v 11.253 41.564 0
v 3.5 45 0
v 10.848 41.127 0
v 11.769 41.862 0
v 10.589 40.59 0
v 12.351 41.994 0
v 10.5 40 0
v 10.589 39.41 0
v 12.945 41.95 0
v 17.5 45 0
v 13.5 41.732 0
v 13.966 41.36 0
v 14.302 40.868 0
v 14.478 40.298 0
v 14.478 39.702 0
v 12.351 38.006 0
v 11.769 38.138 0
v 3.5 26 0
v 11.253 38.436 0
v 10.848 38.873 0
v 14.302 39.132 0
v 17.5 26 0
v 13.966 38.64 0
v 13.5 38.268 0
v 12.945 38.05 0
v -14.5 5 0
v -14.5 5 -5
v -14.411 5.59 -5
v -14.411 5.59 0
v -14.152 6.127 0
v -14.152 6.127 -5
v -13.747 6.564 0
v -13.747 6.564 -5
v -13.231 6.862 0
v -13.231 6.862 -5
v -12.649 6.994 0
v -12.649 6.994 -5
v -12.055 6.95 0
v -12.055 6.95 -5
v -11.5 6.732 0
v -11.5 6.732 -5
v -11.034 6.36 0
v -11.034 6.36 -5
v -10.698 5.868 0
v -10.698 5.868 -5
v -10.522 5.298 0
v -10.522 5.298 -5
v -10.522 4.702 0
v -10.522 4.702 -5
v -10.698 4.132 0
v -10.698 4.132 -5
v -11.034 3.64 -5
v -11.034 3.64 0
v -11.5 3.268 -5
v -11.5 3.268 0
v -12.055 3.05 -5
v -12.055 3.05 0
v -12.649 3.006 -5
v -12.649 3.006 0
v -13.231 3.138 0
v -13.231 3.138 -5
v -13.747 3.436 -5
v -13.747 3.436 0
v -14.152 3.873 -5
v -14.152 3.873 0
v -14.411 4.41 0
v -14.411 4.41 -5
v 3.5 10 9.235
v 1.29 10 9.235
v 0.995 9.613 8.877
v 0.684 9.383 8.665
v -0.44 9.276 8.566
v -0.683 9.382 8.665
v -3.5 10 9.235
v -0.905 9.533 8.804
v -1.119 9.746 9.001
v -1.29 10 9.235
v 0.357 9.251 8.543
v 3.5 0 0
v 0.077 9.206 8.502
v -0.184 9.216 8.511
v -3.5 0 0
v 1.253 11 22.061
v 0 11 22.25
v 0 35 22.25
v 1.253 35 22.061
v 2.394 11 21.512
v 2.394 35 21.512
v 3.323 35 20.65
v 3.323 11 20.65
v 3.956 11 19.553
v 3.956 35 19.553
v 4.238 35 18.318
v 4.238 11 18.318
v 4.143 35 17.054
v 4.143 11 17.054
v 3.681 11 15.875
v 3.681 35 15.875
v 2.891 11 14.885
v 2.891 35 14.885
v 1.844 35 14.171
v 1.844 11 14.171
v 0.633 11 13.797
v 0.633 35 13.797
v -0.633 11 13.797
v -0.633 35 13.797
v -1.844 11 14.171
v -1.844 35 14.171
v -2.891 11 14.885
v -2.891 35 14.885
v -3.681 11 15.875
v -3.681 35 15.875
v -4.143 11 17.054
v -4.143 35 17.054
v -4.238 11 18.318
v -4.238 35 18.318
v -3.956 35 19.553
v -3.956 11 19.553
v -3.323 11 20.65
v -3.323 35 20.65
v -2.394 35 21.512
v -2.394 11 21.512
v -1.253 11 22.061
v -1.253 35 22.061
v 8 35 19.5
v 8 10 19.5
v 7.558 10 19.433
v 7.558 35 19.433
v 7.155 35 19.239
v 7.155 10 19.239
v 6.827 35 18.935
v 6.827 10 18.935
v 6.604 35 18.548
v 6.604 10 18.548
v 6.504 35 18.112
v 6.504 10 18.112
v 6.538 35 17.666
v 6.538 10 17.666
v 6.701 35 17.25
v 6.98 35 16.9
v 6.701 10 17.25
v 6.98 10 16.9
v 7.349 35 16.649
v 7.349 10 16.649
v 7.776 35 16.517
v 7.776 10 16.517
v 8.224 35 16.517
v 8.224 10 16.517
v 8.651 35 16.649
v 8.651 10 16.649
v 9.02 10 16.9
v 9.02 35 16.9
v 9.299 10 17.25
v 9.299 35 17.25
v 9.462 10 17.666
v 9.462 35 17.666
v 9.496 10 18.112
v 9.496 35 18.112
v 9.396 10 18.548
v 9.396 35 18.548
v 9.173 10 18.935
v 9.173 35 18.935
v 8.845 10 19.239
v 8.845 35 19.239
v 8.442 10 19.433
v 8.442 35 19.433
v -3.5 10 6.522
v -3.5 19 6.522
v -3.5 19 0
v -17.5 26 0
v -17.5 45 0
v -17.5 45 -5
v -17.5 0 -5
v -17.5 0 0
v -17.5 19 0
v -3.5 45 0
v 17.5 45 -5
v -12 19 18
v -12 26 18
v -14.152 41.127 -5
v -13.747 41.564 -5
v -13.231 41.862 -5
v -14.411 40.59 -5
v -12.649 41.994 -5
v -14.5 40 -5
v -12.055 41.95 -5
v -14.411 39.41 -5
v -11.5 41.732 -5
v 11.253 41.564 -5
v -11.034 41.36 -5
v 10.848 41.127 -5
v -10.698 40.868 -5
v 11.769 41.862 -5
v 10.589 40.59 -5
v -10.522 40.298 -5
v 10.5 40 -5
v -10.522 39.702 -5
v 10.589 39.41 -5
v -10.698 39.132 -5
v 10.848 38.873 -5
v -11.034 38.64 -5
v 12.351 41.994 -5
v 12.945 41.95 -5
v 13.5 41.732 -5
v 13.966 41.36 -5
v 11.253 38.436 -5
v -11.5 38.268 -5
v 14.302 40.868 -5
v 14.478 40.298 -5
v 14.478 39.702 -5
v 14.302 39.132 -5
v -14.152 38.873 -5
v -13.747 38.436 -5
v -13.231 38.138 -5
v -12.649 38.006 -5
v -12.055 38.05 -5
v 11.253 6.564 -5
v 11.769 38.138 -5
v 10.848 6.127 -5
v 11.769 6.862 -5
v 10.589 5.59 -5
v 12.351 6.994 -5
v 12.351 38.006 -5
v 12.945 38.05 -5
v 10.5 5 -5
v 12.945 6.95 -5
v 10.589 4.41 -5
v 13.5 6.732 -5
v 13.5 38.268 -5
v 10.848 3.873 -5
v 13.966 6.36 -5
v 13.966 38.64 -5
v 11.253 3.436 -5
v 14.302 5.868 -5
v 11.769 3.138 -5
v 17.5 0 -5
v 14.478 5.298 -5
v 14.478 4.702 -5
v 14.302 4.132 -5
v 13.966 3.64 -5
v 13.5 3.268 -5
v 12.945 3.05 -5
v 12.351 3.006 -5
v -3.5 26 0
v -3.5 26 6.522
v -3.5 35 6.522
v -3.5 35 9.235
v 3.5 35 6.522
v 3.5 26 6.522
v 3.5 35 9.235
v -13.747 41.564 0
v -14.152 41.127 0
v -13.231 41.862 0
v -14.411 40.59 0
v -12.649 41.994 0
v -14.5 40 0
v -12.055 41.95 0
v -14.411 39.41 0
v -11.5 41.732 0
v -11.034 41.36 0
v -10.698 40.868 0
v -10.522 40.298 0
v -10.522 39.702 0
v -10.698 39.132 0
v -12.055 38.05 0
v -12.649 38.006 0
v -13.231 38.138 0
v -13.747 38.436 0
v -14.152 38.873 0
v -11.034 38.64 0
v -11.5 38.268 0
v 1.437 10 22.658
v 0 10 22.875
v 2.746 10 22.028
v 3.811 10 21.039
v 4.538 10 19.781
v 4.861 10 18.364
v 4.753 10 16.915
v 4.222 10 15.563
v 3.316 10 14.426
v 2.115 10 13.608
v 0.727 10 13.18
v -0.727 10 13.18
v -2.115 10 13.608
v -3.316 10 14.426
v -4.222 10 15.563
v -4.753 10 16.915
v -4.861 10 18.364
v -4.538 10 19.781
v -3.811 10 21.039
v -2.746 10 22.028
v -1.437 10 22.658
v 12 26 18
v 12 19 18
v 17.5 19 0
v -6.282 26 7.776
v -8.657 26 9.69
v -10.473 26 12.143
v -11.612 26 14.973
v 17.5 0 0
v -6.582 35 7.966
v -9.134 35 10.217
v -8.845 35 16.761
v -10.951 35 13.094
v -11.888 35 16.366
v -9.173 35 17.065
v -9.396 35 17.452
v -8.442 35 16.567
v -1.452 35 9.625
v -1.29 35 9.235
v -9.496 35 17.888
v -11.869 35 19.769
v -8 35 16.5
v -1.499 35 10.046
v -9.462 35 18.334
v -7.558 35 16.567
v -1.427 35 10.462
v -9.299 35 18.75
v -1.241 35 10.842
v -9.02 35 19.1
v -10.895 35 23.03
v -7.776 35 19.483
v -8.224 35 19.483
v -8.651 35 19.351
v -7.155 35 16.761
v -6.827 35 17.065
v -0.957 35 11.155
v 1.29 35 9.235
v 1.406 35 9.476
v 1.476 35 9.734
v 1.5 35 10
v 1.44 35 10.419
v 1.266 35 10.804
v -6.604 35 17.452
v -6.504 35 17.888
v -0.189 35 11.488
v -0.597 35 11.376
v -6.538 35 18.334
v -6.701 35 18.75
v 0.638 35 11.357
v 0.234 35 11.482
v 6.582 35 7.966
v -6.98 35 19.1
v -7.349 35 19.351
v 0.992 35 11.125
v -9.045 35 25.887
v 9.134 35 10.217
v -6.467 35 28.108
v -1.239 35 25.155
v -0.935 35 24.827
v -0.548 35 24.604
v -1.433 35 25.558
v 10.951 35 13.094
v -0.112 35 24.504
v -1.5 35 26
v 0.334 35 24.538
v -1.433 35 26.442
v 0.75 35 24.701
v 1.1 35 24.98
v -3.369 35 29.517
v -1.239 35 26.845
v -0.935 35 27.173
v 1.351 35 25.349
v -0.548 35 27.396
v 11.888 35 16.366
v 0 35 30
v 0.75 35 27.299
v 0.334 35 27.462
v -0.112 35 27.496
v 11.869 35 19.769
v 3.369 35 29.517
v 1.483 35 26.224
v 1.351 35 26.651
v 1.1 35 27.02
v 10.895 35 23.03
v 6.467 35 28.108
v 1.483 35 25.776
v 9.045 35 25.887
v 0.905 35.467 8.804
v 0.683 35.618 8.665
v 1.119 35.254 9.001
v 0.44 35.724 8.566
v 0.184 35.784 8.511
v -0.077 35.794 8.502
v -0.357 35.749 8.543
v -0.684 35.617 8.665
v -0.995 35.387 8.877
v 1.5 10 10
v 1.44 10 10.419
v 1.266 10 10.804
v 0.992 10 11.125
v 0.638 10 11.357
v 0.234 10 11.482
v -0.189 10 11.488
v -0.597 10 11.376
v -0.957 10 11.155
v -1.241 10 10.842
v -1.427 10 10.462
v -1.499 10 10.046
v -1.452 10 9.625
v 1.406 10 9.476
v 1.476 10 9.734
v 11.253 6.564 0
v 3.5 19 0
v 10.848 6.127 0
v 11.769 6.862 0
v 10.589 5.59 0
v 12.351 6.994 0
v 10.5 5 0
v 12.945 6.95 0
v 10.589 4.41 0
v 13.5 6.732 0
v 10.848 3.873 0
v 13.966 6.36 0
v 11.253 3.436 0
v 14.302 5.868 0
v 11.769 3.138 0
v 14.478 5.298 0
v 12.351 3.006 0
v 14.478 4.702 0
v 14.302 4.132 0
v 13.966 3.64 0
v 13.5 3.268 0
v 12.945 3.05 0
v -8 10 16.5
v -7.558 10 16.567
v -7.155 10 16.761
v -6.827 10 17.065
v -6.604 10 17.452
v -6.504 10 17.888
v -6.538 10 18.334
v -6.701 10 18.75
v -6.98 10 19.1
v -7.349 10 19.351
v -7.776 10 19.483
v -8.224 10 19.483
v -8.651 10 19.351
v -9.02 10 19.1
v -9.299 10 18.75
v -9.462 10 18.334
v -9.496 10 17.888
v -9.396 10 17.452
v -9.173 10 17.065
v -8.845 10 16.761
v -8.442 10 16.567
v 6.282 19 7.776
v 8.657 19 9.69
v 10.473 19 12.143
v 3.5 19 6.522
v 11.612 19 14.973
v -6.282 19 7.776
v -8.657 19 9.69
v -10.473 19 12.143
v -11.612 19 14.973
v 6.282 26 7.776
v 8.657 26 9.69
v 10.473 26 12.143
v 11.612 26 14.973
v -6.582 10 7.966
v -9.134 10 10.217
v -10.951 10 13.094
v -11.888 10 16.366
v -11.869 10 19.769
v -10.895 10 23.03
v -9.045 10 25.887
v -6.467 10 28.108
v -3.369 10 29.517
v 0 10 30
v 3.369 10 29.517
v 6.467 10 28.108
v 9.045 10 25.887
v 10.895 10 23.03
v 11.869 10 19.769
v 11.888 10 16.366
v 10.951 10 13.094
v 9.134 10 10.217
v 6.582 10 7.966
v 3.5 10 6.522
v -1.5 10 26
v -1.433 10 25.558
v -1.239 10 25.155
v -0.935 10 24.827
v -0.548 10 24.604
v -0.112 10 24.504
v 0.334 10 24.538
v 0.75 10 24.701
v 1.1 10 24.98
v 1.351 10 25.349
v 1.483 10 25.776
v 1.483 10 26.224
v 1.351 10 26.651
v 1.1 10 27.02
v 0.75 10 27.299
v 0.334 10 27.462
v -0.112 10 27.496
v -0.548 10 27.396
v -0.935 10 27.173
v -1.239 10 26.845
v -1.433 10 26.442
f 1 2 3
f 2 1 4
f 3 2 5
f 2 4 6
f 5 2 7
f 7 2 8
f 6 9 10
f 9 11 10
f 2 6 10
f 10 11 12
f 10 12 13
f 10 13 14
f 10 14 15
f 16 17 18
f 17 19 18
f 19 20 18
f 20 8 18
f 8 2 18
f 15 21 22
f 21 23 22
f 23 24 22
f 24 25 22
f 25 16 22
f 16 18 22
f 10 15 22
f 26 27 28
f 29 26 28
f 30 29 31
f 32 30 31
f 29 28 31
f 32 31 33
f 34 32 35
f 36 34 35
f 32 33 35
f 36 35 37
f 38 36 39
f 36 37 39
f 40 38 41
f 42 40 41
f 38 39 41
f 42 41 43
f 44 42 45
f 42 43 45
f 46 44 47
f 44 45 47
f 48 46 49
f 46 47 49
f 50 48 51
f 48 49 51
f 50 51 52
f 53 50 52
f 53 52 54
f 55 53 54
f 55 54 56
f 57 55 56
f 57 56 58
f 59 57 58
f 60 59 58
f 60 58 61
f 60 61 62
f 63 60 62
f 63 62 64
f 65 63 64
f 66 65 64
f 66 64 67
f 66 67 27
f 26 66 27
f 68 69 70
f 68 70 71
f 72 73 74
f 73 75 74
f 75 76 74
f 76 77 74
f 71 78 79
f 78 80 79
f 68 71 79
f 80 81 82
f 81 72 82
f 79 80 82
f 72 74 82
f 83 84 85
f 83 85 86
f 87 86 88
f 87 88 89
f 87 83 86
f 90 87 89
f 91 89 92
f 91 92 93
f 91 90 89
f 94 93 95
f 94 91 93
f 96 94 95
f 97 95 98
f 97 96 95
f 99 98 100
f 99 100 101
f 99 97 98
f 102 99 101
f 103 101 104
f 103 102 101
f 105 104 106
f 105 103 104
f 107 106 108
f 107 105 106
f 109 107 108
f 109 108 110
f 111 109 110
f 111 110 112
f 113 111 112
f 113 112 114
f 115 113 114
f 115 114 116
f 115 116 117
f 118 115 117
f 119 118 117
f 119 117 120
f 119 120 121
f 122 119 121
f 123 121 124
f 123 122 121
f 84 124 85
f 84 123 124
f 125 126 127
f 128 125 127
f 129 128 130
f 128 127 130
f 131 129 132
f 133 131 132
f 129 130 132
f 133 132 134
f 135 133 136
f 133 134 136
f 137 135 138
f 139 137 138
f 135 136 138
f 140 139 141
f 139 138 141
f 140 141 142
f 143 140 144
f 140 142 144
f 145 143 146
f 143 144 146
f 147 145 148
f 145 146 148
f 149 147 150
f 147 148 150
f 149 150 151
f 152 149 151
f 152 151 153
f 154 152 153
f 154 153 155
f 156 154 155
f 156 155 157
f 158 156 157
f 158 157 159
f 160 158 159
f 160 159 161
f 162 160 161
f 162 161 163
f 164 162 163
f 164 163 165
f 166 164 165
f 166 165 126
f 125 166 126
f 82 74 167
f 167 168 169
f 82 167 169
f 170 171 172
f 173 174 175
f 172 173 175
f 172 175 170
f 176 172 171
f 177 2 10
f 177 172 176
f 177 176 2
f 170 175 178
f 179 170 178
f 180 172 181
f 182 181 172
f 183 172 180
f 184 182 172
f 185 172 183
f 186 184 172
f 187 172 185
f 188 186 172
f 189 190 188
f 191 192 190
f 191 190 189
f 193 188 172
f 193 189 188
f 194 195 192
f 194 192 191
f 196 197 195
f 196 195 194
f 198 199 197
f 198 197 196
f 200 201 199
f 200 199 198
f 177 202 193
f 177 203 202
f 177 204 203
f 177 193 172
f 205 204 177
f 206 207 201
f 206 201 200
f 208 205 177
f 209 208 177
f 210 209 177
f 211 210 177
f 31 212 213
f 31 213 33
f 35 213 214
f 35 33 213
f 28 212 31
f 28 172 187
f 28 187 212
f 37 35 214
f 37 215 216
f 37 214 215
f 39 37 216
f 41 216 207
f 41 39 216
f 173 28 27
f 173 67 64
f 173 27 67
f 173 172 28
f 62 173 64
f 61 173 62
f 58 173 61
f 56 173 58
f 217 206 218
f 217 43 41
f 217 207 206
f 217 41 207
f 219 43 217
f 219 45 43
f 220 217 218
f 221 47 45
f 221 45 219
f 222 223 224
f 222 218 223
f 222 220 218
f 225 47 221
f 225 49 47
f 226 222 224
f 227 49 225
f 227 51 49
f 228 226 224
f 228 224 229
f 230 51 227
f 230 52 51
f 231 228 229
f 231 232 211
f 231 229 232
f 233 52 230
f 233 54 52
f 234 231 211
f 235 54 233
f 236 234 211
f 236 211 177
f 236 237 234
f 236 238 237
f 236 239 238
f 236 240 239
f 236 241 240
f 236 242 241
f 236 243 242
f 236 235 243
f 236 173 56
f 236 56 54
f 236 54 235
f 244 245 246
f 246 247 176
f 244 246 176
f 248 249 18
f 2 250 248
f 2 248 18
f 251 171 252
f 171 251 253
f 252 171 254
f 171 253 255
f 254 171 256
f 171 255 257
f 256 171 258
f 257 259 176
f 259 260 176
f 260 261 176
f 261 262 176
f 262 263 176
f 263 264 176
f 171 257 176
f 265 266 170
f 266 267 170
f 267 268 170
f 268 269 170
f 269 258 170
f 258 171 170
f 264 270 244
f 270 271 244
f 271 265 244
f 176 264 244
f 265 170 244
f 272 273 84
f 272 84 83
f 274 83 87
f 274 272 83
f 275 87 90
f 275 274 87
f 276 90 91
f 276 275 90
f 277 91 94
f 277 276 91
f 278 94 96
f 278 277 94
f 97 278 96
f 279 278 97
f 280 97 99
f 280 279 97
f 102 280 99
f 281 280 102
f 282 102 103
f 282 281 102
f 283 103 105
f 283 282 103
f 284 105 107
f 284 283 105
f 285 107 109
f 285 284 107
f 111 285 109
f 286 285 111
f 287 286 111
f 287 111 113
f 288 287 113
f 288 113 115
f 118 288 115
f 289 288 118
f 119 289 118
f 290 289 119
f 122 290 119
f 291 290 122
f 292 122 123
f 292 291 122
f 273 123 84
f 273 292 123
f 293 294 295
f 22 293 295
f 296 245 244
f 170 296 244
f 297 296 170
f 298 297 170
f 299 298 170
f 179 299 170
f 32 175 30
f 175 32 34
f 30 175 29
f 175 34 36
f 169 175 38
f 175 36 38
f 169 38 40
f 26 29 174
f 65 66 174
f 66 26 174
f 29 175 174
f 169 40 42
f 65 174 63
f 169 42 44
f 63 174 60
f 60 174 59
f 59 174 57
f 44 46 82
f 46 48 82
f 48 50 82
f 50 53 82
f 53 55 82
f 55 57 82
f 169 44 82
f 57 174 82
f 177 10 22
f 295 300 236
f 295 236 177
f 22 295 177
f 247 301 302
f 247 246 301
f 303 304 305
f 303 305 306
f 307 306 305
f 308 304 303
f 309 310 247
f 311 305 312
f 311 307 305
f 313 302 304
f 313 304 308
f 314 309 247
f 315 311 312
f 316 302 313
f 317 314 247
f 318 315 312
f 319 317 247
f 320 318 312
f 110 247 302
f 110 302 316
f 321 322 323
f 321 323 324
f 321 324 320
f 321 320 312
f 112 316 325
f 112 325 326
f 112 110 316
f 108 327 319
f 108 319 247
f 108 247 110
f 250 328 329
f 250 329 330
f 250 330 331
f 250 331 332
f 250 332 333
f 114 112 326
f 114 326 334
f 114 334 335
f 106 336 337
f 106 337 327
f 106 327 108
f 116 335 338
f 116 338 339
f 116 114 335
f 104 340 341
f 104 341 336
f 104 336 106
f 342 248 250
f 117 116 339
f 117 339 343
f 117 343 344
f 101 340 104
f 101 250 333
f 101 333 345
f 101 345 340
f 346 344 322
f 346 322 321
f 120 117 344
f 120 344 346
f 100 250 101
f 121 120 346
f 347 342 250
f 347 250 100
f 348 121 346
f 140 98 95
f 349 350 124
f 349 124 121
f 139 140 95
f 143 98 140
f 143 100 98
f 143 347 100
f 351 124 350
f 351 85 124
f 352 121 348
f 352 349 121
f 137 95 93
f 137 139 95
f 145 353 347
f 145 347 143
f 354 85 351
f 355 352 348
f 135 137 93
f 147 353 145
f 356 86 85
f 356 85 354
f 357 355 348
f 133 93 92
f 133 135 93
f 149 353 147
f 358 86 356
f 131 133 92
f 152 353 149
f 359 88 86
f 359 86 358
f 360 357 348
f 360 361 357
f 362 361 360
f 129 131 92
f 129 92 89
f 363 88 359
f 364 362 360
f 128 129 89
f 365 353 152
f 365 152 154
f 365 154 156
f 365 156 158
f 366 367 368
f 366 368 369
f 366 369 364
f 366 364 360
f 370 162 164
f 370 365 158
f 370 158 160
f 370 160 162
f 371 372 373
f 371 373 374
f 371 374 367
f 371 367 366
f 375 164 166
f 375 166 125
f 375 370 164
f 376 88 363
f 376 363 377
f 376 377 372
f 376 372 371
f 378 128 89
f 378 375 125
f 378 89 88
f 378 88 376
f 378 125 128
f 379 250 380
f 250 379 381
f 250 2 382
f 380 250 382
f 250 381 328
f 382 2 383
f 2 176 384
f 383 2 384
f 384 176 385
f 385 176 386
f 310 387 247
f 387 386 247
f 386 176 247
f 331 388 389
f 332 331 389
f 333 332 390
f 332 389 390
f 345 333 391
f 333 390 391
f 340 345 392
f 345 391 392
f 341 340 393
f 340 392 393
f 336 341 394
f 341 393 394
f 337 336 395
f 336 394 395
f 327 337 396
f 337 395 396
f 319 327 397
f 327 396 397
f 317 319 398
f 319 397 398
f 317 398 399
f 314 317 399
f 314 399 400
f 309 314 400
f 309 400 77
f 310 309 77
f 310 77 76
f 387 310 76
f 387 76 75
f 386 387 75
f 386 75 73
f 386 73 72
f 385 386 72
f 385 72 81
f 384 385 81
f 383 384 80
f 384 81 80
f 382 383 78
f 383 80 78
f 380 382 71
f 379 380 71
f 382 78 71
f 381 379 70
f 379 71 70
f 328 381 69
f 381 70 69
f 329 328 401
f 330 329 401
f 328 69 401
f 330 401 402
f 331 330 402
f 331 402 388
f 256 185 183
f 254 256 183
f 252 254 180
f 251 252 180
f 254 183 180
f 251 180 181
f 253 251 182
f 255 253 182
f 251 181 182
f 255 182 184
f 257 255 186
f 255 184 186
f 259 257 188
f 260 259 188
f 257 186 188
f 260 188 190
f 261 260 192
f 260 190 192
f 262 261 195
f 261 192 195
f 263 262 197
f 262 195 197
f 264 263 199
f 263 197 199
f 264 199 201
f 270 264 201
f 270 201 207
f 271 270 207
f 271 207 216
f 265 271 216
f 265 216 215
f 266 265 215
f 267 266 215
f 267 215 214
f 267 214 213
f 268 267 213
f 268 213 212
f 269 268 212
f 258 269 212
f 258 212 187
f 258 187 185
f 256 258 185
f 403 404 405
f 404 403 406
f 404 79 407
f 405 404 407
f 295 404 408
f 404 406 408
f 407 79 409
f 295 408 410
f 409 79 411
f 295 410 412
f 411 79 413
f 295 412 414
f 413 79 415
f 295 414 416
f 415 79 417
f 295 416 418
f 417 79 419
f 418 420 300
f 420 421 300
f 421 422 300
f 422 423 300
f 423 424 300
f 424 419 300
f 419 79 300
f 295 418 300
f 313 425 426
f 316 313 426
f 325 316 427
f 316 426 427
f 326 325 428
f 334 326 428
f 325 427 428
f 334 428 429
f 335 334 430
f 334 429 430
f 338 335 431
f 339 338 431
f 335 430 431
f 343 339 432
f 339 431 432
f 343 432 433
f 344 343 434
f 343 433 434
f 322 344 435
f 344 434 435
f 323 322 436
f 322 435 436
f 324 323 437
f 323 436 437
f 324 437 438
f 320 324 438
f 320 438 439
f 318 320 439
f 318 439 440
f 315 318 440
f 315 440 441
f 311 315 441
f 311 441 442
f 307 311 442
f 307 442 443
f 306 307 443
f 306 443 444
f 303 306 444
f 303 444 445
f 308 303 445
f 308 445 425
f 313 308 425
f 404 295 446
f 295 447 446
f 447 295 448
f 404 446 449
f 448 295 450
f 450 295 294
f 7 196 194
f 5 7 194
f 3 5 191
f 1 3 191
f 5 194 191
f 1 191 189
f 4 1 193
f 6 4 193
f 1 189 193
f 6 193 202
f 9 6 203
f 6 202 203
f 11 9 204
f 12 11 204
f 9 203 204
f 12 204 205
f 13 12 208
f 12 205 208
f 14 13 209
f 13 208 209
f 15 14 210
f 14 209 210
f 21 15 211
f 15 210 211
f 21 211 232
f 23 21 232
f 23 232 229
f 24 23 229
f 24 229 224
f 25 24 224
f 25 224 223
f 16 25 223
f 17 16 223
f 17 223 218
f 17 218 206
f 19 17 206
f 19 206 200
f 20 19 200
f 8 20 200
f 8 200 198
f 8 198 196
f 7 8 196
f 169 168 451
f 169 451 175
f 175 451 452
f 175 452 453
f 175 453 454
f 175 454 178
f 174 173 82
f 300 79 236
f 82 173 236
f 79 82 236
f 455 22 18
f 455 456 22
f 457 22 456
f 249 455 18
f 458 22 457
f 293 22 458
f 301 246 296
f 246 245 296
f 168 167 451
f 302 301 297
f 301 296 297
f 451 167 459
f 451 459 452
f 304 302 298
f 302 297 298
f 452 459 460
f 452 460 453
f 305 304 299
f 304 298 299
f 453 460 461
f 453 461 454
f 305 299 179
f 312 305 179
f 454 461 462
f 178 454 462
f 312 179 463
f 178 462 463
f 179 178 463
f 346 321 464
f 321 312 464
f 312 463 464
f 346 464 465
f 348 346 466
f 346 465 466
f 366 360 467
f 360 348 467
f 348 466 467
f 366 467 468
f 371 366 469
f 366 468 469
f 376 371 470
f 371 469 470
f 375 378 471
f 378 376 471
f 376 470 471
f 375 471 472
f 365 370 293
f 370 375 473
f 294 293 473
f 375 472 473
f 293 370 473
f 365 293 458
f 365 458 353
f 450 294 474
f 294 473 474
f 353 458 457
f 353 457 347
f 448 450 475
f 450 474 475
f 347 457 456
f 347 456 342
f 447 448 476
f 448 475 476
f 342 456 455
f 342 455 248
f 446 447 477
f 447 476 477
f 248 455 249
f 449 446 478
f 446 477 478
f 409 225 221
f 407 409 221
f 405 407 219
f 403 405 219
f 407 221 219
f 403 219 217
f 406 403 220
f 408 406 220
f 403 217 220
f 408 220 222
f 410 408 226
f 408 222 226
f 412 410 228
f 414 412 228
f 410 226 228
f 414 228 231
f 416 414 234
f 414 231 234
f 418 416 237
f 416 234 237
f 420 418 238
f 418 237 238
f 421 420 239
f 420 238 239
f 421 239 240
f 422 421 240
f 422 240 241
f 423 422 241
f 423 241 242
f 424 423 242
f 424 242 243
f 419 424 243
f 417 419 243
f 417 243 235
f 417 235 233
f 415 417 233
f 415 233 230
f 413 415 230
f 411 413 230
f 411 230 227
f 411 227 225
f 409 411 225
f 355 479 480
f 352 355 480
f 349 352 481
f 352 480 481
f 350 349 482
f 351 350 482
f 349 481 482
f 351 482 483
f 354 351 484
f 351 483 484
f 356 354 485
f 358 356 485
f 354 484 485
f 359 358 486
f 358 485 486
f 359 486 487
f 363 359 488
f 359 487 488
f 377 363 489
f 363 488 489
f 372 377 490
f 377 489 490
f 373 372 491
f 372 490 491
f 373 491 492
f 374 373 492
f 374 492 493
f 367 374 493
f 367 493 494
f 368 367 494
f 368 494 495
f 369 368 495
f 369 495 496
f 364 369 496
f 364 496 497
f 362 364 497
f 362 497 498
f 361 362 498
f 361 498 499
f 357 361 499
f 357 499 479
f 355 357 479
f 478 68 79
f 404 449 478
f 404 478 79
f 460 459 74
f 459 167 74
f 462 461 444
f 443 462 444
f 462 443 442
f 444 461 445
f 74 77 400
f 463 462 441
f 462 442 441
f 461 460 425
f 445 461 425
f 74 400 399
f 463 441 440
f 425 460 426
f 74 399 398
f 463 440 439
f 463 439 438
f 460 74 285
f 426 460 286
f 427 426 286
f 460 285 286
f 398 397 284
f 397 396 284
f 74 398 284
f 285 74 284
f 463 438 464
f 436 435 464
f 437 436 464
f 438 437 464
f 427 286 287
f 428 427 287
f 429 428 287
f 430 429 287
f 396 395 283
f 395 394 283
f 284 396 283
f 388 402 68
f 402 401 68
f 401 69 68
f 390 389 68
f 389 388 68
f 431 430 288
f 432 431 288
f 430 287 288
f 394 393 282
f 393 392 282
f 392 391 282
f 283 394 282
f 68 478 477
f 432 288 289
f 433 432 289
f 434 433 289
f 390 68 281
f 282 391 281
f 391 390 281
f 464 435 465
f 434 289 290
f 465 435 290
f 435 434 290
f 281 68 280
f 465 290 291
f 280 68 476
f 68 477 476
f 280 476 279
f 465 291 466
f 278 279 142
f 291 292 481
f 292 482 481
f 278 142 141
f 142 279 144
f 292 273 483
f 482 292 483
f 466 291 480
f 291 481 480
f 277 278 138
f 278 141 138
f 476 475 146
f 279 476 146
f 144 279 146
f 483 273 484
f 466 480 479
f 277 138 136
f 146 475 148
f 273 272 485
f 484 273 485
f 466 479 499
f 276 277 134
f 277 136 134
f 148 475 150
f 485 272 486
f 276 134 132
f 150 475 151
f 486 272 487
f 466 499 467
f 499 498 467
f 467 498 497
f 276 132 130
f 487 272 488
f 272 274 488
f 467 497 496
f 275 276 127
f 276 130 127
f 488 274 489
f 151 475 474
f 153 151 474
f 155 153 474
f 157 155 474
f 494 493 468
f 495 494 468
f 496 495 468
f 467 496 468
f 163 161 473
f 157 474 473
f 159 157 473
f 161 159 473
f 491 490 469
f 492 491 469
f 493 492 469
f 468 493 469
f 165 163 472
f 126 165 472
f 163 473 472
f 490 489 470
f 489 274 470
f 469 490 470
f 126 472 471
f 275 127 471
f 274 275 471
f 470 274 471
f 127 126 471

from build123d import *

# Parameters (mm, degrees)
SZKIC1_W                               = 35
SZKIC1_H                               = 5
DODANIE_WYCI_GNI_CIE1_DEPTH            = 45
DODANIE_WYCI_GNI_CIE2_START            = 10
SZKIC2_R                               = 12
SZKIC2_R_2                             = 4.25
DODANIE_WYCI_GNI_CIE2_DEPTH            = 25
DODANIE_WYCI_GNI_CIE3_START            = -14
DODANIE_WYCI_GNI_CIE3_DEPTH            = 7
DODANIE_WYCI_GNI_CIE4_START            = -19
DODANIE_WYCI_GNI_CIE4_DEPTH            = 7
WYTNIJ_WYCI_GNI_CIE1_REACH             = 61.634
SZKIC5_R                               = 2
WYTNIJ_WYCI_GNI_CIE2_REACH             = 51.308
SZKIC10_R                              = 1.5
WYTNIJ_WYCI_GNI_CIE2_DIRECTION_2_DEPTH = 3
SZYK_KO_OWY1_COUNT                     = 4
SFAZOWANIE1_SIZE                       = 1
SFAZOWANIE1_SIZE2                      = 0.624869352


with BuildPart() as part:
    # Szkic1 → Dodanie-wyciągnięcie1 (new body)
    with BuildSketch(Plane(origin=(0, 0, 0), x_dir=(1, 0, 0), z_dir=(0, 1, 0))):
        with Locations((0, 2.5)):
            Rectangle(SZKIC1_W, SZKIC1_H)
    extrude(amount=DODANIE_WYCI_GNI_CIE1_DEPTH)



with BuildPart() as body_2:
    # Szkic2 → Dodanie-wyciągnięcie2 (new body)
    with BuildSketch(Plane(origin=(0, 0, 0), x_dir=(1, 0, 0), z_dir=(0, 1, 0)).offset(DODANIE_WYCI_GNI_CIE2_START)):
        with Locations(Location((0, -18, 0), (0, 0, 270))):
            Circle(SZKIC2_R)
        with Locations(Location((0, -18, 0), (0, 0, 270))):
            Circle(SZKIC2_R_2, mode=Mode.SUBTRACT)
    extrude(amount=DODANIE_WYCI_GNI_CIE2_DEPTH)


with BuildPart() as part_1:
    add(part.part)

    add(body_2.part)  # Dodanie-wyciągnięcie3 merges body 2
    # Szkic3 → Dodanie-wyciągnięcie3 (add)
    with BuildSketch(Plane.ZY.offset(17.5).offset(DODANIE_WYCI_GNI_CIE3_START)):
        Polygon((0, 0), (0, 45), (9.234999726, 35), (9.234999726, 10), align=None)
    extrude(amount=-DODANIE_WYCI_GNI_CIE3_DEPTH)

    # Szkic4 → Dodanie-wyciągnięcie4 (add)
    with BuildSketch(Plane.XZ.offset(DODANIE_WYCI_GNI_CIE4_START)):
        Polygon((-17.5, 0), (-12, 18), (0, 9.234999726), (12, 18), (17.5, 0), align=None)
    extrude(amount=-DODANIE_WYCI_GNI_CIE4_DEPTH)

    # Szkic5 → Wytnij-wyciągnięcie1 (cut, up to next)
    with BuildSketch(Plane(origin=(0, 0, -5), x_dir=(-1, 0, 0), z_dir=(0, 0, -1)), mode=Mode.PRIVATE) as wytnij_wyci_gni_cie1_sk1:
        with Locations((-12.5, 40)):
            Circle(SZKIC5_R)
    wytnij_wyci_gni_cie1_tool1 = extrude(wytnij_wyci_gni_cie1_sk1.sketch, amount=-WYTNIJ_WYCI_GNI_CIE1_REACH, mode=Mode.PRIVATE) & part_1.part
    # Szkic5 → Wytnij-wyciągnięcie1 (cut, up to next)
    with BuildSketch(Plane(origin=(0, 0, -5), x_dir=(-1, 0, 0), z_dir=(0, 0, -1)), mode=Mode.PRIVATE) as wytnij_wyci_gni_cie1_sk2:
        with Locations((12.5, 40)):
            Circle(SZKIC5_R)
    wytnij_wyci_gni_cie1_tool2 = extrude(wytnij_wyci_gni_cie1_sk2.sketch, amount=-WYTNIJ_WYCI_GNI_CIE1_REACH, mode=Mode.PRIVATE) & part_1.part
    # Szkic5 → Wytnij-wyciągnięcie1 (cut, up to next)
    with BuildSketch(Plane(origin=(0, 0, -5), x_dir=(-1, 0, 0), z_dir=(0, 0, -1)), mode=Mode.PRIVATE) as wytnij_wyci_gni_cie1_sk3:
        with Locations((12.5, 5)):
            Circle(SZKIC5_R)
    wytnij_wyci_gni_cie1_tool3 = extrude(wytnij_wyci_gni_cie1_sk3.sketch, amount=-WYTNIJ_WYCI_GNI_CIE1_REACH, mode=Mode.PRIVATE) & part_1.part
    # Szkic5 → Wytnij-wyciągnięcie1 (cut, up to next)
    with BuildSketch(Plane(origin=(0, 0, -5), x_dir=(-1, 0, 0), z_dir=(0, 0, -1)), mode=Mode.PRIVATE) as wytnij_wyci_gni_cie1_sk4:
        with Locations((-12.5, 5)):
            Circle(SZKIC5_R)
    wytnij_wyci_gni_cie1_tool4 = extrude(wytnij_wyci_gni_cie1_sk4.sketch, amount=-WYTNIJ_WYCI_GNI_CIE1_REACH, mode=Mode.PRIVATE) & part_1.part
    add(wytnij_wyci_gni_cie1_tool1.solids().sort_by_distance((12.5, 40, -5))[0], mode=Mode.SUBTRACT)
    add(wytnij_wyci_gni_cie1_tool2.solids().sort_by_distance((-12.5, 40, -5))[0], mode=Mode.SUBTRACT)
    add(wytnij_wyci_gni_cie1_tool3.solids().sort_by_distance((-12.5, 5, -5))[0], mode=Mode.SUBTRACT)
    add(wytnij_wyci_gni_cie1_tool4.solids().sort_by_distance((12.5, 5, -5))[0], mode=Mode.SUBTRACT)

    # Szkic10 → Wytnij-wyciągnięcie2 (cut, up to next)
    with BuildSketch(Plane(origin=(0, 10, 0), x_dir=(-1, 0, 0), z_dir=(0, -1, 0)), mode=Mode.PRIVATE) as wytnij_wyci_gni_cie2_sk1:
        with Locations(Location((-8, -18, 0), (0, 0, 270))):
            Circle(SZKIC10_R)
    wytnij_wyci_gni_cie2_tool1 = extrude(wytnij_wyci_gni_cie2_sk1.sketch, amount=-WYTNIJ_WYCI_GNI_CIE2_REACH, mode=Mode.PRIVATE) & part_1.part
    wytnij_wyci_gni_cie2 = wytnij_wyci_gni_cie2_tool1.solids().sort_by_distance((8, 10, 18))[0]
    add(wytnij_wyci_gni_cie2, mode=Mode.SUBTRACT)

    # Szkic10 → Wytnij-wyciągnięcie2 direction 2 (cut)
    with BuildSketch(Plane(origin=(0, 10, 0), x_dir=(-1, 0, 0), z_dir=(0, -1, 0))):
        with Locations(Location((-8, -18, 0), (0, 0, 270))):
            Circle(SZKIC10_R)
    wytnij_wyci_gni_cie2_direction_2 = extrude(amount=WYTNIJ_WYCI_GNI_CIE2_DIRECTION_2_DEPTH, mode=Mode.SUBTRACT)

    # Szyk kołowy1: Wytnij-wyciągnięcie2, Wytnij-wyciągnięcie2 direction 2; each copy of Wytnij-wyciągnięcie2 runs up to whatever stops it at its own place
    szyk_ko_owy1_before = part_1.part  # the part as the pattern finds it: every copy runs up to it
    szyk_ko_owy1_wytnij_wyci_gni_cie2_long = extrude(wytnij_wyci_gni_cie2_sk1.sketch, amount=-WYTNIJ_WYCI_GNI_CIE2_REACH, mode=Mode.PRIVATE)
    szyk_ko_owy1_wytnij_wyci_gni_cie2_tool1 = szyk_ko_owy1_wytnij_wyci_gni_cie2_long.rotate(Axis((0, 0, 18), (0, 1, 0)), 1 * 360 / SZYK_KO_OWY1_COUNT) & szyk_ko_owy1_before
    add(szyk_ko_owy1_wytnij_wyci_gni_cie2_tool1.solids().sort_by_distance((0, 10, 10))[0], mode=Mode.SUBTRACT)
    szyk_ko_owy1_wytnij_wyci_gni_cie2_tool2 = szyk_ko_owy1_wytnij_wyci_gni_cie2_long.rotate(Axis((0, 0, 18), (0, 1, 0)), 2 * 360 / SZYK_KO_OWY1_COUNT) & szyk_ko_owy1_before
    add(szyk_ko_owy1_wytnij_wyci_gni_cie2_tool2.solids().sort_by_distance((-8, 10, 18))[0], mode=Mode.SUBTRACT)
    szyk_ko_owy1_wytnij_wyci_gni_cie2_tool3 = szyk_ko_owy1_wytnij_wyci_gni_cie2_long.rotate(Axis((0, 0, 18), (0, 1, 0)), 3 * 360 / SZYK_KO_OWY1_COUNT) & szyk_ko_owy1_before
    add(szyk_ko_owy1_wytnij_wyci_gni_cie2_tool3.solids().sort_by_distance((0, 10, 26))[0], mode=Mode.SUBTRACT)
    add(wytnij_wyci_gni_cie2_direction_2.rotate(Axis((0, 0, 18), (0, 1, 0)), 1 * 360 / SZYK_KO_OWY1_COUNT), mode=Mode.SUBTRACT)
    add(wytnij_wyci_gni_cie2_direction_2.rotate(Axis((0, 0, 18), (0, 1, 0)), 2 * 360 / SZYK_KO_OWY1_COUNT), mode=Mode.SUBTRACT)
    add(wytnij_wyci_gni_cie2_direction_2.rotate(Axis((0, 0, 18), (0, 1, 0)), 3 * 360 / SZYK_KO_OWY1_COUNT), mode=Mode.SUBTRACT)

    # Sfazowanie1
    sfazowanie1_edges = [part_1.edges().sort_by_distance(p)[0] for p in [
        (0, 10, 13.75),
    ]]
    sfazowanie1_side = [part_1.faces().sort_by_distance(p)[0] for p in [
        (0, 22.5, 13.75),
    ]]
    chamfer(sfazowanie1_edges, length=SFAZOWANIE1_SIZE, length2=SFAZOWANIE1_SIZE2, reference=sfazowanie1_side[0])


solid = part_1.part
